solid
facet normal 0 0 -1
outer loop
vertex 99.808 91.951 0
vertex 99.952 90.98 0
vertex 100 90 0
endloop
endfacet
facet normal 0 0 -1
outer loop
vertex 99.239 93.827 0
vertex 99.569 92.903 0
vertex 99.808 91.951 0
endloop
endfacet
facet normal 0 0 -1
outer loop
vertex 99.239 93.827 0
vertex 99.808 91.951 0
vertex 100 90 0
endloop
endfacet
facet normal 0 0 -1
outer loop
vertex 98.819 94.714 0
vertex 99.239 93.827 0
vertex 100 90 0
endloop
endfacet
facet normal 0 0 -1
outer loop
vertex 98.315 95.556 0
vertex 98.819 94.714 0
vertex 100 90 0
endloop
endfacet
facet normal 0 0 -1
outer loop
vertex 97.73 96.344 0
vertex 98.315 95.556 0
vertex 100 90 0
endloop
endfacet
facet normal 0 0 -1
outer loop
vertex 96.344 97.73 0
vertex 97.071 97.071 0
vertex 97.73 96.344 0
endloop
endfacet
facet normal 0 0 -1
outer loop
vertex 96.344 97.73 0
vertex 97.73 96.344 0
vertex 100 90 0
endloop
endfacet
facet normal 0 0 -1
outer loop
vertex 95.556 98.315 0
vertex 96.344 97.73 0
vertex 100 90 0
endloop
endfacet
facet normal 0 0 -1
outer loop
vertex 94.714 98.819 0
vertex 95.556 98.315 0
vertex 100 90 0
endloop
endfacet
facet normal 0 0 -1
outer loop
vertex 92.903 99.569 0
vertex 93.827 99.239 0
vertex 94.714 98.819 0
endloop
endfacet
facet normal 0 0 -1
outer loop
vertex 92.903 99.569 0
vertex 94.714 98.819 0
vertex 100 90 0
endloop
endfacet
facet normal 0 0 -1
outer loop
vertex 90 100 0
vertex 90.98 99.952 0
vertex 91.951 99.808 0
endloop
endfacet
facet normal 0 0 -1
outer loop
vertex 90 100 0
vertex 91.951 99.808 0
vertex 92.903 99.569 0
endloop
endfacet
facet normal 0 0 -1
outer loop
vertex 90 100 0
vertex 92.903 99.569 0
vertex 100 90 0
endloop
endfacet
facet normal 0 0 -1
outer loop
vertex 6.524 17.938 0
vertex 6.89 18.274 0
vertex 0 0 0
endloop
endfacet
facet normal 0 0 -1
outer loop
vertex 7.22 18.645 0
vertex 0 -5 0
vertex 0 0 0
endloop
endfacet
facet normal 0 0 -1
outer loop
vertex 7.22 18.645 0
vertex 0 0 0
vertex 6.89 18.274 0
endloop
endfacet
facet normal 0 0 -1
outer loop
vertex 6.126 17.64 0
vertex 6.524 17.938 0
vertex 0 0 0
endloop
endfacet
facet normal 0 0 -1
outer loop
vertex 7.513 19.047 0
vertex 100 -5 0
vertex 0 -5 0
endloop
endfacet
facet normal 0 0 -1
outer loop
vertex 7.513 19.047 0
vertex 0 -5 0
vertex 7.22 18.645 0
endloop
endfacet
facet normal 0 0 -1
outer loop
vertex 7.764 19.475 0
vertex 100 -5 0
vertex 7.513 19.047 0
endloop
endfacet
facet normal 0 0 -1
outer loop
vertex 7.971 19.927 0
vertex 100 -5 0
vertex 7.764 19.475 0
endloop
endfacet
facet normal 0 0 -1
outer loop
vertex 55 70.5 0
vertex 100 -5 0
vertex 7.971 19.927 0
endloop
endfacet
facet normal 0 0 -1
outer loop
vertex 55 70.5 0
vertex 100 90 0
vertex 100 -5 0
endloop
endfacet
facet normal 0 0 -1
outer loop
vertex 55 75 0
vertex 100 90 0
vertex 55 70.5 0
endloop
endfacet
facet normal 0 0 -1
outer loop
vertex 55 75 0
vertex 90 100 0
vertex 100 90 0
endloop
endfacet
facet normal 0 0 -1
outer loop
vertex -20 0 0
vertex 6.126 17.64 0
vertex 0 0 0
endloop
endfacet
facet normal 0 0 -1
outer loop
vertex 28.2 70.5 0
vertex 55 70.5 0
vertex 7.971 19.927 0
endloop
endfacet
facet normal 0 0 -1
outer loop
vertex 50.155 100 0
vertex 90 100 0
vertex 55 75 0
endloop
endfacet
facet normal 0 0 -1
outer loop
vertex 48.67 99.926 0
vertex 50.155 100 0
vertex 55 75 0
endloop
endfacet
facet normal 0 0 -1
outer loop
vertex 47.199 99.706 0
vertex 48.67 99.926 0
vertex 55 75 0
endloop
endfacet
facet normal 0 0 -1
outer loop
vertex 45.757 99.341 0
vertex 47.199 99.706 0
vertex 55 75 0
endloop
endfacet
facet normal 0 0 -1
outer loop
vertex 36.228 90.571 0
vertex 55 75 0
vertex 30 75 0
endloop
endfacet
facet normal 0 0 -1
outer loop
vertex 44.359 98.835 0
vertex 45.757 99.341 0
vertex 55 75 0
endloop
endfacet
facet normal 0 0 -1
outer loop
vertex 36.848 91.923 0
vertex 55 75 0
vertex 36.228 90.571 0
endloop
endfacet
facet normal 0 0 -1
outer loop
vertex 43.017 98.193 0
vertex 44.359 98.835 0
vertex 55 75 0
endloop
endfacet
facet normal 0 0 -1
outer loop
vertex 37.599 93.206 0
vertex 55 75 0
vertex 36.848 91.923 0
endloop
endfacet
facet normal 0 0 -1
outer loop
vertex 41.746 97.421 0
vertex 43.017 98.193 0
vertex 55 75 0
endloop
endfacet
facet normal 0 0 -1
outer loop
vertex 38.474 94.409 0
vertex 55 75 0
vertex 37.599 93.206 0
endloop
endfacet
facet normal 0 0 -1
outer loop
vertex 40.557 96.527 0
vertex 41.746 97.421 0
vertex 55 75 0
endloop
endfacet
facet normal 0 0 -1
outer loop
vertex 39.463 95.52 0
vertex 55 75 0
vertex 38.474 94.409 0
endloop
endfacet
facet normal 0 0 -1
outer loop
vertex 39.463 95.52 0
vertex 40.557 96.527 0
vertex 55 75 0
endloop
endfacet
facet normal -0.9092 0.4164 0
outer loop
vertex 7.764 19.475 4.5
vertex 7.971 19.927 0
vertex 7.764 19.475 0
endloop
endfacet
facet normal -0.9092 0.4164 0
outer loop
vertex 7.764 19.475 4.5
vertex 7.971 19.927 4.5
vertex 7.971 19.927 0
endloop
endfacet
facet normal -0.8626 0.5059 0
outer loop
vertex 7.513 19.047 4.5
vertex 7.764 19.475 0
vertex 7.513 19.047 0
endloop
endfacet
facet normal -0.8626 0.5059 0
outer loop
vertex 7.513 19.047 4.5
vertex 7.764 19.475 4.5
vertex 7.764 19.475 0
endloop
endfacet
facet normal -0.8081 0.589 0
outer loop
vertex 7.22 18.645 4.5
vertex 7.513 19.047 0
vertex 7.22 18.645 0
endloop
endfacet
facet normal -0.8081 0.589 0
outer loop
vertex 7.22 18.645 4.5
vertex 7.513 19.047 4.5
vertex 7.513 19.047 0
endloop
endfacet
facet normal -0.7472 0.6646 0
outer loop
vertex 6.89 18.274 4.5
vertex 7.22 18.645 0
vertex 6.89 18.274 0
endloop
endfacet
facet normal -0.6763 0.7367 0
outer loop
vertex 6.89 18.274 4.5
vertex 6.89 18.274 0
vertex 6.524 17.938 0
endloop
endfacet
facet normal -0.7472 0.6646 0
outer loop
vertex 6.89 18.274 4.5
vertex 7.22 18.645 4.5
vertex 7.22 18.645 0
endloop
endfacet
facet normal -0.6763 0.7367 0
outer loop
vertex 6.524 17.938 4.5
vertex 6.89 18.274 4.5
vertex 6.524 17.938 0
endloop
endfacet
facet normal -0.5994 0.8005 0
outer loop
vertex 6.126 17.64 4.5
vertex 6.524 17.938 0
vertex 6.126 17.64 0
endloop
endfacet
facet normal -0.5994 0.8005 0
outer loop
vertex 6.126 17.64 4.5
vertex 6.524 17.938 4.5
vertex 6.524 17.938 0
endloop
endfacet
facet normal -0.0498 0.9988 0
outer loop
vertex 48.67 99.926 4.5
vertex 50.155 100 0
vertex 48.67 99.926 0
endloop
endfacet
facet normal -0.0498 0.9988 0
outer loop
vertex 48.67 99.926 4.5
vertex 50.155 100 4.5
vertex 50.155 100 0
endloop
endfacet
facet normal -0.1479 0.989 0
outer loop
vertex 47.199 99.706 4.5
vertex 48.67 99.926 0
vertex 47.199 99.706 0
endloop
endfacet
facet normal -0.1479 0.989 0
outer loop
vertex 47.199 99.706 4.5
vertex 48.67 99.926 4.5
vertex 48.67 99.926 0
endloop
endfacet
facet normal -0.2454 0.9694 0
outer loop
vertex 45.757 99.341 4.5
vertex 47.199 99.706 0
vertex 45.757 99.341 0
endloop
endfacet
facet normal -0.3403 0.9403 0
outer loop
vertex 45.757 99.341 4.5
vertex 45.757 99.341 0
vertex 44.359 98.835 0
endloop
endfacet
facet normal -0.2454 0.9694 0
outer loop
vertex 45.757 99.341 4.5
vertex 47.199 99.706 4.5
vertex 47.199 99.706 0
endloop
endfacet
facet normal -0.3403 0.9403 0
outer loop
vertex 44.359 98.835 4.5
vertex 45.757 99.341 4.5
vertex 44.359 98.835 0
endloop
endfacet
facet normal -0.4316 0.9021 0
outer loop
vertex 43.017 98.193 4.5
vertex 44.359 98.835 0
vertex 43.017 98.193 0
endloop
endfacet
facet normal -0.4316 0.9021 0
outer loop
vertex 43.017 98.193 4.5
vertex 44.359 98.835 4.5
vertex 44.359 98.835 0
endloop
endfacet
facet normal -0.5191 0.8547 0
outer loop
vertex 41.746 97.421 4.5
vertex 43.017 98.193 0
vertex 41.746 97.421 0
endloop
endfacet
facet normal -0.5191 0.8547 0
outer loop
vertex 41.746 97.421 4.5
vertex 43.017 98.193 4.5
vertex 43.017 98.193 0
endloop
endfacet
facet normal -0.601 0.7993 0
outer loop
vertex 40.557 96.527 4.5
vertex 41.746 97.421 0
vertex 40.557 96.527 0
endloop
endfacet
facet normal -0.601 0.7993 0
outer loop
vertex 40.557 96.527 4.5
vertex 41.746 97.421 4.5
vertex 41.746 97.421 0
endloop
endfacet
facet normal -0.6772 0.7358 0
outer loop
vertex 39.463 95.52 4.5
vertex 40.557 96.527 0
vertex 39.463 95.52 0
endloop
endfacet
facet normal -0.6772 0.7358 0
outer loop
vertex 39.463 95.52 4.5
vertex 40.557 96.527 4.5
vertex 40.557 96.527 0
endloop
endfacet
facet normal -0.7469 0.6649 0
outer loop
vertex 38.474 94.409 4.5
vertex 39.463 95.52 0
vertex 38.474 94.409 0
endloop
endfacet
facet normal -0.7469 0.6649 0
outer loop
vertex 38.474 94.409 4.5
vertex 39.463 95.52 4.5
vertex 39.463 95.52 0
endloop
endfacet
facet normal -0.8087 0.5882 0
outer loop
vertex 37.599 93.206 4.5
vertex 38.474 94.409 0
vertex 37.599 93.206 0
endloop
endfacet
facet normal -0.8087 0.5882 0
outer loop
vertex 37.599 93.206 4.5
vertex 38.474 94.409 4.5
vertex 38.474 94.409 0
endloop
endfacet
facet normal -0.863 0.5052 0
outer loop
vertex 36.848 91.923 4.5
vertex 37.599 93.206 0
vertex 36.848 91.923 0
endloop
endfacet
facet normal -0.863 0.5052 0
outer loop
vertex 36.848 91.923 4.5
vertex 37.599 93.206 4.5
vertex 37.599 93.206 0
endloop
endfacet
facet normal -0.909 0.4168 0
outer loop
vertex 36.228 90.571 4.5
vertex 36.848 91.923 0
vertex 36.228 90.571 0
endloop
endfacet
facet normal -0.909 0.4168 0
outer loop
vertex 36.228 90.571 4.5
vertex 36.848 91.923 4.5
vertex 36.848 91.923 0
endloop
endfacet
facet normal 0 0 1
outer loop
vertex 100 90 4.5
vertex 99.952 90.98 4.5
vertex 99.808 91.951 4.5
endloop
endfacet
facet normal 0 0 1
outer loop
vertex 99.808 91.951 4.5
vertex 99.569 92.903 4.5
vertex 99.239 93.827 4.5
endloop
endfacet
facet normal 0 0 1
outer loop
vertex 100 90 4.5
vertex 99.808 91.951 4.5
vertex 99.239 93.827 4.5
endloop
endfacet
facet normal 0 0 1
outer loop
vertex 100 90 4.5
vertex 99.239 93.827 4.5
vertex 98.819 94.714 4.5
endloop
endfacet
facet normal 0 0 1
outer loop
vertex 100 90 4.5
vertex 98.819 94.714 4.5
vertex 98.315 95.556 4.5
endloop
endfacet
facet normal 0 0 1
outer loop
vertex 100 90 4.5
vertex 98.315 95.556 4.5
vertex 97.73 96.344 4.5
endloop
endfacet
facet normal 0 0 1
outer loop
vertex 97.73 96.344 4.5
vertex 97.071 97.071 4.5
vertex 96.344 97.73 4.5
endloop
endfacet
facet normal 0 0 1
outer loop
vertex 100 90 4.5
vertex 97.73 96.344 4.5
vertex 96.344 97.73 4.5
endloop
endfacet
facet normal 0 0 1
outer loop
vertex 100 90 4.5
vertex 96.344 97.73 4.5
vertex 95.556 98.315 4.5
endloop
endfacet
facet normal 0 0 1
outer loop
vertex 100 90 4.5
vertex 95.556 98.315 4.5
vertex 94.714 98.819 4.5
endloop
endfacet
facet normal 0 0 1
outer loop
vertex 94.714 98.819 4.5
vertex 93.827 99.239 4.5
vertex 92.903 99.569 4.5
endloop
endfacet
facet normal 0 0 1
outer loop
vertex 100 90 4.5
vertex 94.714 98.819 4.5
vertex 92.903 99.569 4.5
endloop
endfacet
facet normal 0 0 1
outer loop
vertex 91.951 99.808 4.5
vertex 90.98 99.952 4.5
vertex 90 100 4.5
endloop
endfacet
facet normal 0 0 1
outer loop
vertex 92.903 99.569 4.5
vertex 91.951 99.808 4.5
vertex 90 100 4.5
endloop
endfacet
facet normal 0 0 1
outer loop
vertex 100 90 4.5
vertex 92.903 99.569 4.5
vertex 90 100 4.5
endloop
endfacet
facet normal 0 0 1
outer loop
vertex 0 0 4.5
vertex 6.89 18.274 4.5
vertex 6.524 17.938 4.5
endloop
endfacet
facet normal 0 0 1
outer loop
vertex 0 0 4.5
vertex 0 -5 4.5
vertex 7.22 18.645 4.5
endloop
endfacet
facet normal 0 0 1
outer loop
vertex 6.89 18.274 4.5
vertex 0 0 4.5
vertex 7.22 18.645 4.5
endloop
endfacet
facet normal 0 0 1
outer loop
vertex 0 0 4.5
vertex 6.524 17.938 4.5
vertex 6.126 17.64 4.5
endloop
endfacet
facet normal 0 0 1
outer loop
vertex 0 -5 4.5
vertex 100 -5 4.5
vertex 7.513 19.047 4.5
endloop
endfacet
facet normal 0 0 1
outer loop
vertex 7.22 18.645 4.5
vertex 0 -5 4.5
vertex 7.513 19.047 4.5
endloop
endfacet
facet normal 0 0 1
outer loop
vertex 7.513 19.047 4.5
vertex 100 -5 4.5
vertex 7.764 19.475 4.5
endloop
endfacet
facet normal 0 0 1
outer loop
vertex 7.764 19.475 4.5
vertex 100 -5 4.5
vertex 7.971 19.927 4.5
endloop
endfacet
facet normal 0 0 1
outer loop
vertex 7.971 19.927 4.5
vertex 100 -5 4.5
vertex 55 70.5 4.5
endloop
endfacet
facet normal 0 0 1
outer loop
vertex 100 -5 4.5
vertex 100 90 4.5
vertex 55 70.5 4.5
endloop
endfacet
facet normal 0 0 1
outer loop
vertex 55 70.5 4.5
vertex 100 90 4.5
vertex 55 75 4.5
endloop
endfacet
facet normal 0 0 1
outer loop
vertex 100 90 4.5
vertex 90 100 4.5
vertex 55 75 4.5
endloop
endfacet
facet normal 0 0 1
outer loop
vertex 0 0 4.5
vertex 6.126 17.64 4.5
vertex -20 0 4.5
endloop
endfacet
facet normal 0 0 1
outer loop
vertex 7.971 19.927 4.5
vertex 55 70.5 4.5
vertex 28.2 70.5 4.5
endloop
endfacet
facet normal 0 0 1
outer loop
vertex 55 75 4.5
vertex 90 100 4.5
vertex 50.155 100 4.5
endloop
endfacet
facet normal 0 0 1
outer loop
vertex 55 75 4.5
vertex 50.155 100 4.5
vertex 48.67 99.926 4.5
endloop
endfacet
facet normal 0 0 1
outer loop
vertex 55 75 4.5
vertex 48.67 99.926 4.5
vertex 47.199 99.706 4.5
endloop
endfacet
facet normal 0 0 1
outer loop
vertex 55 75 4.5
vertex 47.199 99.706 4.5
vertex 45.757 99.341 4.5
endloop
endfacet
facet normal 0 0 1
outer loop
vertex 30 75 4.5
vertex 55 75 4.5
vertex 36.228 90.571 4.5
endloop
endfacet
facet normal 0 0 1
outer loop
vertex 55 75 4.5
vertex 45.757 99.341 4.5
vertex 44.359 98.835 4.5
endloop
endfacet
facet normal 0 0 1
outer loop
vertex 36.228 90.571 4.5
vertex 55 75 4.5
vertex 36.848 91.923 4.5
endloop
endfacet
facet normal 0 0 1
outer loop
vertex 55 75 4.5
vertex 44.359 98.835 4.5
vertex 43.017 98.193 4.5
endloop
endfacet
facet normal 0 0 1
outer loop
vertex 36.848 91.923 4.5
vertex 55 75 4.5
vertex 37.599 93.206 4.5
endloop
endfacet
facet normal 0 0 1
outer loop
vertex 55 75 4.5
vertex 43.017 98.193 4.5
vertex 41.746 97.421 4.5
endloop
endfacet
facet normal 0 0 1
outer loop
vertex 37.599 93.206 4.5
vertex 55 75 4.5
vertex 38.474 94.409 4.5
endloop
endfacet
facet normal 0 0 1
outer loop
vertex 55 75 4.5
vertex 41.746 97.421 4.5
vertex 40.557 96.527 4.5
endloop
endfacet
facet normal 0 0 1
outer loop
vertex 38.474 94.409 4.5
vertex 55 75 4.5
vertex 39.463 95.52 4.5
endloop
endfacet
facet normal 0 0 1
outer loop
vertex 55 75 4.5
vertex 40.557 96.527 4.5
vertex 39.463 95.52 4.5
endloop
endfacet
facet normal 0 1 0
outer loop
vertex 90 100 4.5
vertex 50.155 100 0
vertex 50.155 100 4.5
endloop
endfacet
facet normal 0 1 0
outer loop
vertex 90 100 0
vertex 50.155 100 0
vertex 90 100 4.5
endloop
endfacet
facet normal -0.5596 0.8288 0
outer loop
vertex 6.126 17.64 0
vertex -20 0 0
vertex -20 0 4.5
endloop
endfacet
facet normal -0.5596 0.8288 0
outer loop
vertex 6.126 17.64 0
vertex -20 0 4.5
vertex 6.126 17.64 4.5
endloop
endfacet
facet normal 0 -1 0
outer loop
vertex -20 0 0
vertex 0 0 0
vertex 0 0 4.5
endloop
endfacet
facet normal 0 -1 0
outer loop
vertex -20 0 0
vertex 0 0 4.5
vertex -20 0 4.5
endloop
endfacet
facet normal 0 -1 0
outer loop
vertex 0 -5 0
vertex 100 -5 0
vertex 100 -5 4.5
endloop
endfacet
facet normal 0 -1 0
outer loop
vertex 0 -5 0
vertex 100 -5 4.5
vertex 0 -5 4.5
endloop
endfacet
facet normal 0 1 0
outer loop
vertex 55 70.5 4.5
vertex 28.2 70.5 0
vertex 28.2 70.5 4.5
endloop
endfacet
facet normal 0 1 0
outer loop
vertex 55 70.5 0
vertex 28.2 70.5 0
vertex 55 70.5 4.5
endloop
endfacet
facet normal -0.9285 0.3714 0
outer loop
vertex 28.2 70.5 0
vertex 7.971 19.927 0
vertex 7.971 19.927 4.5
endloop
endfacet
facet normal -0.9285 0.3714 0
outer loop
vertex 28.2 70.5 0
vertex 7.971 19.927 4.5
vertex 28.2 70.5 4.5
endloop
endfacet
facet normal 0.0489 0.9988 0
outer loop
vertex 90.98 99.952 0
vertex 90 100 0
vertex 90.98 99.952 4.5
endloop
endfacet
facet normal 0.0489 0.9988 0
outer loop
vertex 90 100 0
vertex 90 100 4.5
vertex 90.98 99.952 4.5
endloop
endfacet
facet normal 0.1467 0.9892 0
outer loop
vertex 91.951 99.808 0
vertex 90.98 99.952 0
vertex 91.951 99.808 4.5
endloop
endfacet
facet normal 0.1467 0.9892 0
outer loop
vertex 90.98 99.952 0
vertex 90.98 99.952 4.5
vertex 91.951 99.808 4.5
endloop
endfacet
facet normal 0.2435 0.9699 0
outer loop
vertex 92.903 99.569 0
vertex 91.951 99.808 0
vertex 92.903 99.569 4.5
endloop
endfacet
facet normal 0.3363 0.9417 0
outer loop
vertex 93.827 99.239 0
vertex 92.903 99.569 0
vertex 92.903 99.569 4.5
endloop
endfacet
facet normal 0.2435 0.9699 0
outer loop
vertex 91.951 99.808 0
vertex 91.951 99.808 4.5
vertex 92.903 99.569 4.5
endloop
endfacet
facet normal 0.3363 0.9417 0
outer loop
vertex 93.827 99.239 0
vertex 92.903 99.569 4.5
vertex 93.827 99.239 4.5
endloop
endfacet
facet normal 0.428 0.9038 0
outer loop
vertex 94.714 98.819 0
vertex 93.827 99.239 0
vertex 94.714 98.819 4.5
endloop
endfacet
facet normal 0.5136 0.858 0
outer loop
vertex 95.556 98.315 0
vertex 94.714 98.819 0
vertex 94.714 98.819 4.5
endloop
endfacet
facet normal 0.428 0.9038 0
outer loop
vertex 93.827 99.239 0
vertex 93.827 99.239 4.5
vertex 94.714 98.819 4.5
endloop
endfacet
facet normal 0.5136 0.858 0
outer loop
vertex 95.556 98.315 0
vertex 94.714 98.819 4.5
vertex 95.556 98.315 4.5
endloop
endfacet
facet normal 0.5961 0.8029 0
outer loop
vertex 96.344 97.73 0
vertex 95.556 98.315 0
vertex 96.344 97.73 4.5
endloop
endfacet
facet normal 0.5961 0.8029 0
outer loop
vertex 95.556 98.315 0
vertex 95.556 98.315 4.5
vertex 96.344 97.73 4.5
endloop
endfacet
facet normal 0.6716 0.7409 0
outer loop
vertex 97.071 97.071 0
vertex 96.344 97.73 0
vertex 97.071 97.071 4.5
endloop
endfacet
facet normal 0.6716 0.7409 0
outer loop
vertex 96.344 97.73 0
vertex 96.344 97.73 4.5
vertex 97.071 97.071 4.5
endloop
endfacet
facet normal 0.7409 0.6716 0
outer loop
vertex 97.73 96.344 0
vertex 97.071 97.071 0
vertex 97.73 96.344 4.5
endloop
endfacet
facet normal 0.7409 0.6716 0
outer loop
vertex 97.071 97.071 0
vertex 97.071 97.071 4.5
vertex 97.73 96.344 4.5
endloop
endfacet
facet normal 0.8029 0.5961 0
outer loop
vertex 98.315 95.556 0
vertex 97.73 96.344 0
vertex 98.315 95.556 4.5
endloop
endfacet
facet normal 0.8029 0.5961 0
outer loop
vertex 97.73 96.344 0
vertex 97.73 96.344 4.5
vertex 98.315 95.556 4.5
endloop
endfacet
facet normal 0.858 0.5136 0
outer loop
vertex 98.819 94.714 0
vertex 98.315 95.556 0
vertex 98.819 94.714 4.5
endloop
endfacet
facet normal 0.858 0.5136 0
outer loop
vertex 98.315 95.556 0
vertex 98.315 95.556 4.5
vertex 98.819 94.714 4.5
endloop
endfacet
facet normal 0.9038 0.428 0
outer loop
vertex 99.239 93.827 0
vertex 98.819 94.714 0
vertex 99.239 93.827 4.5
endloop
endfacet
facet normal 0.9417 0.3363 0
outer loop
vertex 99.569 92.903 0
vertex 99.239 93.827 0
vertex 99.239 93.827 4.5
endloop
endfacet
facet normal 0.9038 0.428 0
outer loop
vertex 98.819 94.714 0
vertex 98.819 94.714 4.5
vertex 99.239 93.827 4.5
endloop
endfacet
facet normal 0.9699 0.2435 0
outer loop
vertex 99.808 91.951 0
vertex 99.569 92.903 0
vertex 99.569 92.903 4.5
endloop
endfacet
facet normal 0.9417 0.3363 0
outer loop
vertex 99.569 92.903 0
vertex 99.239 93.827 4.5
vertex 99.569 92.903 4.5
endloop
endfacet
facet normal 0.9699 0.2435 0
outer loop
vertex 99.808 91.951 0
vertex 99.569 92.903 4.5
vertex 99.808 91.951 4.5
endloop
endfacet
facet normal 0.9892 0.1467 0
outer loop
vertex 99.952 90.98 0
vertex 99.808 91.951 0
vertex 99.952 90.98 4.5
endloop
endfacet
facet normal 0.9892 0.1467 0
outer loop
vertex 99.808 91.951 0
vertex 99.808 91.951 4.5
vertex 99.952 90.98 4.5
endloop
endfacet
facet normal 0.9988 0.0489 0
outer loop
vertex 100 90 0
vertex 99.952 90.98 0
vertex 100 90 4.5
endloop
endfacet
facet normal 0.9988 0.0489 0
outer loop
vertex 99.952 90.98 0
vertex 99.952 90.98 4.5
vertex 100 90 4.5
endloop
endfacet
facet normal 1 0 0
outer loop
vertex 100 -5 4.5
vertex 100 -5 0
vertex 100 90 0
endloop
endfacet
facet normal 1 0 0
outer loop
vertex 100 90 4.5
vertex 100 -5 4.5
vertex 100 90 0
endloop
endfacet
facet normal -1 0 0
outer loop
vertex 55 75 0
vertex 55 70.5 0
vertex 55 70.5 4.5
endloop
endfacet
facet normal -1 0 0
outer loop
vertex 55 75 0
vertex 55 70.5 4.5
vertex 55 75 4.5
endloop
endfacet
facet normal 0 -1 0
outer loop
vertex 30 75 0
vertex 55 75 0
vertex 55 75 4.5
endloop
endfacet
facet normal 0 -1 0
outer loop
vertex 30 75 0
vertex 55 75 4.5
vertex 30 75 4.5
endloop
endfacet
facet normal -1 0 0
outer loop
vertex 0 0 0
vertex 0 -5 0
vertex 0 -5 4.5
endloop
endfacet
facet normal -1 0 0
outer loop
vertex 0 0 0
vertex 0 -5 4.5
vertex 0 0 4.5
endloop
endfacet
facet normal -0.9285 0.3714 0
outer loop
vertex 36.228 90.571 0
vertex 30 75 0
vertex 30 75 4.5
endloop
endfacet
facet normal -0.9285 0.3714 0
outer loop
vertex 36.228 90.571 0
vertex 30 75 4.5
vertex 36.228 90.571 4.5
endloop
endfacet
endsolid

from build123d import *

# Parameters (mm, degrees)
BOSS_EXTRUDE1_DEPTH = 4.5
FILLET1_R           = 5
FILLET2_R           = 10
FILLET3_R           = 15


with BuildPart() as part:
    # Sketch1 → Boss-Extrude1 (new body)
    with BuildSketch(Plane.XY):
        Polygon((7.4, 18.5), (28.2, 70.5), (55, 70.5), (55, 75), (30, 75), (40, 100), (100, 100), (100, 0), (100, -5), (0, -5), (0, 0), (-20, 0), align=None)
    extrude(amount=BOSS_EXTRUDE1_DEPTH)

    # Fillet1
    fillet1_edges = [part.edges().sort_by_distance(p)[0] for p in [
        (7.4, 18.5, 2.25),
    ]]
    fillet(fillet1_edges, radius=FILLET1_R)

    # Fillet2
    fillet2_edges = [part.edges().sort_by_distance(p)[0] for p in [
        (100, 100, 2.25),
    ]]
    fillet(fillet2_edges, radius=FILLET2_R)

    # Fillet3
    fillet3_edges = [part.edges().sort_by_distance(p)[0] for p in [
        (40, 100, 2.25),
    ]]
    fillet(fillet3_edges, radius=FILLET3_R)


solid = part.part
